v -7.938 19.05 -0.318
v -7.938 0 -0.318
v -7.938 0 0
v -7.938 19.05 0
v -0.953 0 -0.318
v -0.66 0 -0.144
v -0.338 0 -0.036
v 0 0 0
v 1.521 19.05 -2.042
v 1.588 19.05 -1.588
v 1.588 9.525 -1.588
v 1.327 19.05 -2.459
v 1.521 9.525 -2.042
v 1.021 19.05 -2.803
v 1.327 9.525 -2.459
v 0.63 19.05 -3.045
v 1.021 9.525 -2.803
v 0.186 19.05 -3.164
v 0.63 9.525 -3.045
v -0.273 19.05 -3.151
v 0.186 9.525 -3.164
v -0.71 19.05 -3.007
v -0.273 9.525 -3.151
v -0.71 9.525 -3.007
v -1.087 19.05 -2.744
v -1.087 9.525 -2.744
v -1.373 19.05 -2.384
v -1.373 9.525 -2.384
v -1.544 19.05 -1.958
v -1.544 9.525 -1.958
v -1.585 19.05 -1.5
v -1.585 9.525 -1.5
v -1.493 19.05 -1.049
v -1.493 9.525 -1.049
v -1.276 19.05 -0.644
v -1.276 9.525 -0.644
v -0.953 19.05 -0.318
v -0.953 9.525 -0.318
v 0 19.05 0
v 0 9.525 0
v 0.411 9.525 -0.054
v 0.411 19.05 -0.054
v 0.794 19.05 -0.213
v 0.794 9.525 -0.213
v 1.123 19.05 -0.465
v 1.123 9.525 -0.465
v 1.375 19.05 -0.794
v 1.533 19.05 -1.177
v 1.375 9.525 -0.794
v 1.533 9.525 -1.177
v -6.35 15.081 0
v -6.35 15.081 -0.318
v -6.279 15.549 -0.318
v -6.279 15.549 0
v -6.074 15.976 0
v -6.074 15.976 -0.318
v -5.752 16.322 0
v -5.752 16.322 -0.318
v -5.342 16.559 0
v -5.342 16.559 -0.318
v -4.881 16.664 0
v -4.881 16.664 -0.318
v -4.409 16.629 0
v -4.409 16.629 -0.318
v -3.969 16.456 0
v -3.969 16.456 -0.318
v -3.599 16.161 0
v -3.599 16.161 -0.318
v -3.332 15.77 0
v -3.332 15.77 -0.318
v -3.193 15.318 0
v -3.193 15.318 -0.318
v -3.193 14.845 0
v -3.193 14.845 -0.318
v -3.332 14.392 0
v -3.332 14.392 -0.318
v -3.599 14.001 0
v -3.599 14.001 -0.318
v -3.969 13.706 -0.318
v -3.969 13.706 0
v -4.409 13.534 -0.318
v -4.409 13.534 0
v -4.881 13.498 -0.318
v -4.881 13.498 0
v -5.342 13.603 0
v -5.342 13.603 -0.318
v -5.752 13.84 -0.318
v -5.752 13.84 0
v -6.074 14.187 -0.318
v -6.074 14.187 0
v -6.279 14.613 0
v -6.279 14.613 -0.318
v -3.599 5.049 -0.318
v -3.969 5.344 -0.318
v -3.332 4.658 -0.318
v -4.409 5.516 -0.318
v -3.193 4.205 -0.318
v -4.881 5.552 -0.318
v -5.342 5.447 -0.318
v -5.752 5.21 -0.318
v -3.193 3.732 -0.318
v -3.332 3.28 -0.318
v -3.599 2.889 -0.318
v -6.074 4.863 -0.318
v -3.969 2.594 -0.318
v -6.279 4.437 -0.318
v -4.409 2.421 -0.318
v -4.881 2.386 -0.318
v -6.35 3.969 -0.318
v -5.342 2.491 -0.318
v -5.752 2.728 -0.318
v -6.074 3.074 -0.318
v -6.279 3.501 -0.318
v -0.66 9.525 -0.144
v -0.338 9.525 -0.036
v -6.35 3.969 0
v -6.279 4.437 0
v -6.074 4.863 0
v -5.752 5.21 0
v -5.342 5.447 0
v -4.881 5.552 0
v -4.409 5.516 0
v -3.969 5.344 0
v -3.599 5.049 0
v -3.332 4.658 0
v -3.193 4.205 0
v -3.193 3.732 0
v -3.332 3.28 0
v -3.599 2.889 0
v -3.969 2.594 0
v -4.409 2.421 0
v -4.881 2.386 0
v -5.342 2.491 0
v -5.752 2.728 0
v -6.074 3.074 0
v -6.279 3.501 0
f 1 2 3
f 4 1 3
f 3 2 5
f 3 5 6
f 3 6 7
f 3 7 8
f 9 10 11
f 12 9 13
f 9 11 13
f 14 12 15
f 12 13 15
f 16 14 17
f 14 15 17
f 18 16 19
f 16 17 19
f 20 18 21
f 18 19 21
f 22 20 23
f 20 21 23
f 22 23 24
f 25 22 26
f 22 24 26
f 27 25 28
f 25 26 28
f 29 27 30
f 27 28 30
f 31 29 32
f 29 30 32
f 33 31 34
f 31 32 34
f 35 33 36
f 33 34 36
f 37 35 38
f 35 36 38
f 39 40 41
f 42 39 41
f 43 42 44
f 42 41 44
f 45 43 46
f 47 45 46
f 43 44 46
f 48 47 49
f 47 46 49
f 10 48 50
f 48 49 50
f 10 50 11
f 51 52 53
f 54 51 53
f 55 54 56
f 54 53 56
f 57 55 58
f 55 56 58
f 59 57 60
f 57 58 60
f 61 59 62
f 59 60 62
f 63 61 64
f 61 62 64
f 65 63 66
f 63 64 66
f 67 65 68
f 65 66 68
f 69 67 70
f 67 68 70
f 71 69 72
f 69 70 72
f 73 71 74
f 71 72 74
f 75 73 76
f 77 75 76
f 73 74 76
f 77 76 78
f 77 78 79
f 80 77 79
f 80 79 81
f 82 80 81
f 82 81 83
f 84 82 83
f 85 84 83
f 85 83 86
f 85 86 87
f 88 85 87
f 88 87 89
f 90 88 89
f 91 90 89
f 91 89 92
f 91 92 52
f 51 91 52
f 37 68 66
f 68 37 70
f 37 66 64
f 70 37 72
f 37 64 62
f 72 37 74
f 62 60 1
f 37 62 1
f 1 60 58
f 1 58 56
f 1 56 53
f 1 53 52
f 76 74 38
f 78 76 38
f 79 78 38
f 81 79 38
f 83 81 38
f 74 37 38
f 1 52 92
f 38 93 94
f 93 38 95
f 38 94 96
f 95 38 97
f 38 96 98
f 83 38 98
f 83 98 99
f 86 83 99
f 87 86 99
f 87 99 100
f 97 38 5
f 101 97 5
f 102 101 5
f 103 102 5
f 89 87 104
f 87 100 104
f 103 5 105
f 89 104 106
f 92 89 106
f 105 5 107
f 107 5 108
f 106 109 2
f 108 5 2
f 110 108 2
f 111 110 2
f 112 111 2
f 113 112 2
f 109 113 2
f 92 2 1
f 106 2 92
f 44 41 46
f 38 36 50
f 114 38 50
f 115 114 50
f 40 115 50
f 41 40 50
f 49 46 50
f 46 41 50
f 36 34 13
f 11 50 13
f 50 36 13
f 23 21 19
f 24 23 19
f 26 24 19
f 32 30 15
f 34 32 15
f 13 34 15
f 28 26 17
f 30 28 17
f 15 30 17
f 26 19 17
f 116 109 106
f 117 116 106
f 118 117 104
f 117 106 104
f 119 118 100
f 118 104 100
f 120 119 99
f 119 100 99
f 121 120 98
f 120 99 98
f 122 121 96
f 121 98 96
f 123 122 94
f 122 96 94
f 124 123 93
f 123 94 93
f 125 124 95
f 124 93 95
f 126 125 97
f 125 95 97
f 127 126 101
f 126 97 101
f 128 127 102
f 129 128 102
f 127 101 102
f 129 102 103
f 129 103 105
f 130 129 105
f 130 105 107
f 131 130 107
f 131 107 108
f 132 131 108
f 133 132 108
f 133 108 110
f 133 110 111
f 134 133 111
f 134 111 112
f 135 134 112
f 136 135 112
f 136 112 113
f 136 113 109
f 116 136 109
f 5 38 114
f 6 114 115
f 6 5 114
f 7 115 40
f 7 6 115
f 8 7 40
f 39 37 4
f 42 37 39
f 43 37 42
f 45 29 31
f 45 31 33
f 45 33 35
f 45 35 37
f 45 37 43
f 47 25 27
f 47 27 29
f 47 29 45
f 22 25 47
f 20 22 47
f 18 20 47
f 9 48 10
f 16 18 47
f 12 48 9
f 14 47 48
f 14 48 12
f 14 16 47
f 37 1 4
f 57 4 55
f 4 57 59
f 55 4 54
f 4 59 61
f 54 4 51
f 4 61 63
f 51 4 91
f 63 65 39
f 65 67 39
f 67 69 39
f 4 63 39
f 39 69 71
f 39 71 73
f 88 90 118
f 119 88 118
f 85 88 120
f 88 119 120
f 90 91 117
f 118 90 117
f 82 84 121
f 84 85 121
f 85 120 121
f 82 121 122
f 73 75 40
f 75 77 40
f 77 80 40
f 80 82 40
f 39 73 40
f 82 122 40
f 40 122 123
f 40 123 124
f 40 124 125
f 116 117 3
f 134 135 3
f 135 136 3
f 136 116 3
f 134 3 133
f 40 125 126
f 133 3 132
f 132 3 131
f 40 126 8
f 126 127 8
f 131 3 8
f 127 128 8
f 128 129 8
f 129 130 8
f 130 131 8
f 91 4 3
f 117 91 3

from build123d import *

# Parameters (mm, degrees)
BOSS_EXTRUDE1_DEPTH = 19.05
SKETCH1_4_R         = 1.5875
CUT_EXTRUDE2_DEPTH  = 9.525
SKETCH2_R           = 1.5875
CUT_EXTRUDE3_DEPTH  = 21.83438774


with BuildPart() as part:
    # Sketch1 → Boss-Extrude1 (new body)
    with BuildSketch(Plane(origin=(0, 0, 0), x_dir=(1, 0, 0), z_dir=(0, 1, 0))):
        with BuildLine():
            Line((-0.9525, 0.3175), (-7.9375, 0.3175))
            Line((-7.9375, 0.3175), (-7.9375, 0))
            Line((-7.9375, 0), (0, 0))
            ThreePointArc((0, 0), (0.502011579, 3.093534736), (-0.9525, 0.3175))
        make_face()
    extrude(amount=BOSS_EXTRUDE1_DEPTH)

    # Sketch1<4> → Cut-Extrude2 (cut)
    with BuildSketch(Plane(origin=(0, 0, 0), x_dir=(1, 0, 0), z_dir=(0, 1, 0))):
        with Locations((0, 1.5875)):
            Circle(SKETCH1_4_R)
    extrude(amount=CUT_EXTRUDE2_DEPTH, mode=Mode.SUBTRACT)

    # Sketch2 → Cut-Extrude3 (cut, through all)
    with BuildSketch(Plane(origin=(0, 0, -0.3175), x_dir=(-1, 0, 0), z_dir=(0, 0, -1))):
        with Locations((4.7625, 15.08125)):
            Circle(SKETCH2_R)
        with Locations((4.7625, 3.96875)):
            Circle(SKETCH2_R)
    extrude(amount=-CUT_EXTRUDE3_DEPTH, mode=Mode.SUBTRACT)


solid = part.part
